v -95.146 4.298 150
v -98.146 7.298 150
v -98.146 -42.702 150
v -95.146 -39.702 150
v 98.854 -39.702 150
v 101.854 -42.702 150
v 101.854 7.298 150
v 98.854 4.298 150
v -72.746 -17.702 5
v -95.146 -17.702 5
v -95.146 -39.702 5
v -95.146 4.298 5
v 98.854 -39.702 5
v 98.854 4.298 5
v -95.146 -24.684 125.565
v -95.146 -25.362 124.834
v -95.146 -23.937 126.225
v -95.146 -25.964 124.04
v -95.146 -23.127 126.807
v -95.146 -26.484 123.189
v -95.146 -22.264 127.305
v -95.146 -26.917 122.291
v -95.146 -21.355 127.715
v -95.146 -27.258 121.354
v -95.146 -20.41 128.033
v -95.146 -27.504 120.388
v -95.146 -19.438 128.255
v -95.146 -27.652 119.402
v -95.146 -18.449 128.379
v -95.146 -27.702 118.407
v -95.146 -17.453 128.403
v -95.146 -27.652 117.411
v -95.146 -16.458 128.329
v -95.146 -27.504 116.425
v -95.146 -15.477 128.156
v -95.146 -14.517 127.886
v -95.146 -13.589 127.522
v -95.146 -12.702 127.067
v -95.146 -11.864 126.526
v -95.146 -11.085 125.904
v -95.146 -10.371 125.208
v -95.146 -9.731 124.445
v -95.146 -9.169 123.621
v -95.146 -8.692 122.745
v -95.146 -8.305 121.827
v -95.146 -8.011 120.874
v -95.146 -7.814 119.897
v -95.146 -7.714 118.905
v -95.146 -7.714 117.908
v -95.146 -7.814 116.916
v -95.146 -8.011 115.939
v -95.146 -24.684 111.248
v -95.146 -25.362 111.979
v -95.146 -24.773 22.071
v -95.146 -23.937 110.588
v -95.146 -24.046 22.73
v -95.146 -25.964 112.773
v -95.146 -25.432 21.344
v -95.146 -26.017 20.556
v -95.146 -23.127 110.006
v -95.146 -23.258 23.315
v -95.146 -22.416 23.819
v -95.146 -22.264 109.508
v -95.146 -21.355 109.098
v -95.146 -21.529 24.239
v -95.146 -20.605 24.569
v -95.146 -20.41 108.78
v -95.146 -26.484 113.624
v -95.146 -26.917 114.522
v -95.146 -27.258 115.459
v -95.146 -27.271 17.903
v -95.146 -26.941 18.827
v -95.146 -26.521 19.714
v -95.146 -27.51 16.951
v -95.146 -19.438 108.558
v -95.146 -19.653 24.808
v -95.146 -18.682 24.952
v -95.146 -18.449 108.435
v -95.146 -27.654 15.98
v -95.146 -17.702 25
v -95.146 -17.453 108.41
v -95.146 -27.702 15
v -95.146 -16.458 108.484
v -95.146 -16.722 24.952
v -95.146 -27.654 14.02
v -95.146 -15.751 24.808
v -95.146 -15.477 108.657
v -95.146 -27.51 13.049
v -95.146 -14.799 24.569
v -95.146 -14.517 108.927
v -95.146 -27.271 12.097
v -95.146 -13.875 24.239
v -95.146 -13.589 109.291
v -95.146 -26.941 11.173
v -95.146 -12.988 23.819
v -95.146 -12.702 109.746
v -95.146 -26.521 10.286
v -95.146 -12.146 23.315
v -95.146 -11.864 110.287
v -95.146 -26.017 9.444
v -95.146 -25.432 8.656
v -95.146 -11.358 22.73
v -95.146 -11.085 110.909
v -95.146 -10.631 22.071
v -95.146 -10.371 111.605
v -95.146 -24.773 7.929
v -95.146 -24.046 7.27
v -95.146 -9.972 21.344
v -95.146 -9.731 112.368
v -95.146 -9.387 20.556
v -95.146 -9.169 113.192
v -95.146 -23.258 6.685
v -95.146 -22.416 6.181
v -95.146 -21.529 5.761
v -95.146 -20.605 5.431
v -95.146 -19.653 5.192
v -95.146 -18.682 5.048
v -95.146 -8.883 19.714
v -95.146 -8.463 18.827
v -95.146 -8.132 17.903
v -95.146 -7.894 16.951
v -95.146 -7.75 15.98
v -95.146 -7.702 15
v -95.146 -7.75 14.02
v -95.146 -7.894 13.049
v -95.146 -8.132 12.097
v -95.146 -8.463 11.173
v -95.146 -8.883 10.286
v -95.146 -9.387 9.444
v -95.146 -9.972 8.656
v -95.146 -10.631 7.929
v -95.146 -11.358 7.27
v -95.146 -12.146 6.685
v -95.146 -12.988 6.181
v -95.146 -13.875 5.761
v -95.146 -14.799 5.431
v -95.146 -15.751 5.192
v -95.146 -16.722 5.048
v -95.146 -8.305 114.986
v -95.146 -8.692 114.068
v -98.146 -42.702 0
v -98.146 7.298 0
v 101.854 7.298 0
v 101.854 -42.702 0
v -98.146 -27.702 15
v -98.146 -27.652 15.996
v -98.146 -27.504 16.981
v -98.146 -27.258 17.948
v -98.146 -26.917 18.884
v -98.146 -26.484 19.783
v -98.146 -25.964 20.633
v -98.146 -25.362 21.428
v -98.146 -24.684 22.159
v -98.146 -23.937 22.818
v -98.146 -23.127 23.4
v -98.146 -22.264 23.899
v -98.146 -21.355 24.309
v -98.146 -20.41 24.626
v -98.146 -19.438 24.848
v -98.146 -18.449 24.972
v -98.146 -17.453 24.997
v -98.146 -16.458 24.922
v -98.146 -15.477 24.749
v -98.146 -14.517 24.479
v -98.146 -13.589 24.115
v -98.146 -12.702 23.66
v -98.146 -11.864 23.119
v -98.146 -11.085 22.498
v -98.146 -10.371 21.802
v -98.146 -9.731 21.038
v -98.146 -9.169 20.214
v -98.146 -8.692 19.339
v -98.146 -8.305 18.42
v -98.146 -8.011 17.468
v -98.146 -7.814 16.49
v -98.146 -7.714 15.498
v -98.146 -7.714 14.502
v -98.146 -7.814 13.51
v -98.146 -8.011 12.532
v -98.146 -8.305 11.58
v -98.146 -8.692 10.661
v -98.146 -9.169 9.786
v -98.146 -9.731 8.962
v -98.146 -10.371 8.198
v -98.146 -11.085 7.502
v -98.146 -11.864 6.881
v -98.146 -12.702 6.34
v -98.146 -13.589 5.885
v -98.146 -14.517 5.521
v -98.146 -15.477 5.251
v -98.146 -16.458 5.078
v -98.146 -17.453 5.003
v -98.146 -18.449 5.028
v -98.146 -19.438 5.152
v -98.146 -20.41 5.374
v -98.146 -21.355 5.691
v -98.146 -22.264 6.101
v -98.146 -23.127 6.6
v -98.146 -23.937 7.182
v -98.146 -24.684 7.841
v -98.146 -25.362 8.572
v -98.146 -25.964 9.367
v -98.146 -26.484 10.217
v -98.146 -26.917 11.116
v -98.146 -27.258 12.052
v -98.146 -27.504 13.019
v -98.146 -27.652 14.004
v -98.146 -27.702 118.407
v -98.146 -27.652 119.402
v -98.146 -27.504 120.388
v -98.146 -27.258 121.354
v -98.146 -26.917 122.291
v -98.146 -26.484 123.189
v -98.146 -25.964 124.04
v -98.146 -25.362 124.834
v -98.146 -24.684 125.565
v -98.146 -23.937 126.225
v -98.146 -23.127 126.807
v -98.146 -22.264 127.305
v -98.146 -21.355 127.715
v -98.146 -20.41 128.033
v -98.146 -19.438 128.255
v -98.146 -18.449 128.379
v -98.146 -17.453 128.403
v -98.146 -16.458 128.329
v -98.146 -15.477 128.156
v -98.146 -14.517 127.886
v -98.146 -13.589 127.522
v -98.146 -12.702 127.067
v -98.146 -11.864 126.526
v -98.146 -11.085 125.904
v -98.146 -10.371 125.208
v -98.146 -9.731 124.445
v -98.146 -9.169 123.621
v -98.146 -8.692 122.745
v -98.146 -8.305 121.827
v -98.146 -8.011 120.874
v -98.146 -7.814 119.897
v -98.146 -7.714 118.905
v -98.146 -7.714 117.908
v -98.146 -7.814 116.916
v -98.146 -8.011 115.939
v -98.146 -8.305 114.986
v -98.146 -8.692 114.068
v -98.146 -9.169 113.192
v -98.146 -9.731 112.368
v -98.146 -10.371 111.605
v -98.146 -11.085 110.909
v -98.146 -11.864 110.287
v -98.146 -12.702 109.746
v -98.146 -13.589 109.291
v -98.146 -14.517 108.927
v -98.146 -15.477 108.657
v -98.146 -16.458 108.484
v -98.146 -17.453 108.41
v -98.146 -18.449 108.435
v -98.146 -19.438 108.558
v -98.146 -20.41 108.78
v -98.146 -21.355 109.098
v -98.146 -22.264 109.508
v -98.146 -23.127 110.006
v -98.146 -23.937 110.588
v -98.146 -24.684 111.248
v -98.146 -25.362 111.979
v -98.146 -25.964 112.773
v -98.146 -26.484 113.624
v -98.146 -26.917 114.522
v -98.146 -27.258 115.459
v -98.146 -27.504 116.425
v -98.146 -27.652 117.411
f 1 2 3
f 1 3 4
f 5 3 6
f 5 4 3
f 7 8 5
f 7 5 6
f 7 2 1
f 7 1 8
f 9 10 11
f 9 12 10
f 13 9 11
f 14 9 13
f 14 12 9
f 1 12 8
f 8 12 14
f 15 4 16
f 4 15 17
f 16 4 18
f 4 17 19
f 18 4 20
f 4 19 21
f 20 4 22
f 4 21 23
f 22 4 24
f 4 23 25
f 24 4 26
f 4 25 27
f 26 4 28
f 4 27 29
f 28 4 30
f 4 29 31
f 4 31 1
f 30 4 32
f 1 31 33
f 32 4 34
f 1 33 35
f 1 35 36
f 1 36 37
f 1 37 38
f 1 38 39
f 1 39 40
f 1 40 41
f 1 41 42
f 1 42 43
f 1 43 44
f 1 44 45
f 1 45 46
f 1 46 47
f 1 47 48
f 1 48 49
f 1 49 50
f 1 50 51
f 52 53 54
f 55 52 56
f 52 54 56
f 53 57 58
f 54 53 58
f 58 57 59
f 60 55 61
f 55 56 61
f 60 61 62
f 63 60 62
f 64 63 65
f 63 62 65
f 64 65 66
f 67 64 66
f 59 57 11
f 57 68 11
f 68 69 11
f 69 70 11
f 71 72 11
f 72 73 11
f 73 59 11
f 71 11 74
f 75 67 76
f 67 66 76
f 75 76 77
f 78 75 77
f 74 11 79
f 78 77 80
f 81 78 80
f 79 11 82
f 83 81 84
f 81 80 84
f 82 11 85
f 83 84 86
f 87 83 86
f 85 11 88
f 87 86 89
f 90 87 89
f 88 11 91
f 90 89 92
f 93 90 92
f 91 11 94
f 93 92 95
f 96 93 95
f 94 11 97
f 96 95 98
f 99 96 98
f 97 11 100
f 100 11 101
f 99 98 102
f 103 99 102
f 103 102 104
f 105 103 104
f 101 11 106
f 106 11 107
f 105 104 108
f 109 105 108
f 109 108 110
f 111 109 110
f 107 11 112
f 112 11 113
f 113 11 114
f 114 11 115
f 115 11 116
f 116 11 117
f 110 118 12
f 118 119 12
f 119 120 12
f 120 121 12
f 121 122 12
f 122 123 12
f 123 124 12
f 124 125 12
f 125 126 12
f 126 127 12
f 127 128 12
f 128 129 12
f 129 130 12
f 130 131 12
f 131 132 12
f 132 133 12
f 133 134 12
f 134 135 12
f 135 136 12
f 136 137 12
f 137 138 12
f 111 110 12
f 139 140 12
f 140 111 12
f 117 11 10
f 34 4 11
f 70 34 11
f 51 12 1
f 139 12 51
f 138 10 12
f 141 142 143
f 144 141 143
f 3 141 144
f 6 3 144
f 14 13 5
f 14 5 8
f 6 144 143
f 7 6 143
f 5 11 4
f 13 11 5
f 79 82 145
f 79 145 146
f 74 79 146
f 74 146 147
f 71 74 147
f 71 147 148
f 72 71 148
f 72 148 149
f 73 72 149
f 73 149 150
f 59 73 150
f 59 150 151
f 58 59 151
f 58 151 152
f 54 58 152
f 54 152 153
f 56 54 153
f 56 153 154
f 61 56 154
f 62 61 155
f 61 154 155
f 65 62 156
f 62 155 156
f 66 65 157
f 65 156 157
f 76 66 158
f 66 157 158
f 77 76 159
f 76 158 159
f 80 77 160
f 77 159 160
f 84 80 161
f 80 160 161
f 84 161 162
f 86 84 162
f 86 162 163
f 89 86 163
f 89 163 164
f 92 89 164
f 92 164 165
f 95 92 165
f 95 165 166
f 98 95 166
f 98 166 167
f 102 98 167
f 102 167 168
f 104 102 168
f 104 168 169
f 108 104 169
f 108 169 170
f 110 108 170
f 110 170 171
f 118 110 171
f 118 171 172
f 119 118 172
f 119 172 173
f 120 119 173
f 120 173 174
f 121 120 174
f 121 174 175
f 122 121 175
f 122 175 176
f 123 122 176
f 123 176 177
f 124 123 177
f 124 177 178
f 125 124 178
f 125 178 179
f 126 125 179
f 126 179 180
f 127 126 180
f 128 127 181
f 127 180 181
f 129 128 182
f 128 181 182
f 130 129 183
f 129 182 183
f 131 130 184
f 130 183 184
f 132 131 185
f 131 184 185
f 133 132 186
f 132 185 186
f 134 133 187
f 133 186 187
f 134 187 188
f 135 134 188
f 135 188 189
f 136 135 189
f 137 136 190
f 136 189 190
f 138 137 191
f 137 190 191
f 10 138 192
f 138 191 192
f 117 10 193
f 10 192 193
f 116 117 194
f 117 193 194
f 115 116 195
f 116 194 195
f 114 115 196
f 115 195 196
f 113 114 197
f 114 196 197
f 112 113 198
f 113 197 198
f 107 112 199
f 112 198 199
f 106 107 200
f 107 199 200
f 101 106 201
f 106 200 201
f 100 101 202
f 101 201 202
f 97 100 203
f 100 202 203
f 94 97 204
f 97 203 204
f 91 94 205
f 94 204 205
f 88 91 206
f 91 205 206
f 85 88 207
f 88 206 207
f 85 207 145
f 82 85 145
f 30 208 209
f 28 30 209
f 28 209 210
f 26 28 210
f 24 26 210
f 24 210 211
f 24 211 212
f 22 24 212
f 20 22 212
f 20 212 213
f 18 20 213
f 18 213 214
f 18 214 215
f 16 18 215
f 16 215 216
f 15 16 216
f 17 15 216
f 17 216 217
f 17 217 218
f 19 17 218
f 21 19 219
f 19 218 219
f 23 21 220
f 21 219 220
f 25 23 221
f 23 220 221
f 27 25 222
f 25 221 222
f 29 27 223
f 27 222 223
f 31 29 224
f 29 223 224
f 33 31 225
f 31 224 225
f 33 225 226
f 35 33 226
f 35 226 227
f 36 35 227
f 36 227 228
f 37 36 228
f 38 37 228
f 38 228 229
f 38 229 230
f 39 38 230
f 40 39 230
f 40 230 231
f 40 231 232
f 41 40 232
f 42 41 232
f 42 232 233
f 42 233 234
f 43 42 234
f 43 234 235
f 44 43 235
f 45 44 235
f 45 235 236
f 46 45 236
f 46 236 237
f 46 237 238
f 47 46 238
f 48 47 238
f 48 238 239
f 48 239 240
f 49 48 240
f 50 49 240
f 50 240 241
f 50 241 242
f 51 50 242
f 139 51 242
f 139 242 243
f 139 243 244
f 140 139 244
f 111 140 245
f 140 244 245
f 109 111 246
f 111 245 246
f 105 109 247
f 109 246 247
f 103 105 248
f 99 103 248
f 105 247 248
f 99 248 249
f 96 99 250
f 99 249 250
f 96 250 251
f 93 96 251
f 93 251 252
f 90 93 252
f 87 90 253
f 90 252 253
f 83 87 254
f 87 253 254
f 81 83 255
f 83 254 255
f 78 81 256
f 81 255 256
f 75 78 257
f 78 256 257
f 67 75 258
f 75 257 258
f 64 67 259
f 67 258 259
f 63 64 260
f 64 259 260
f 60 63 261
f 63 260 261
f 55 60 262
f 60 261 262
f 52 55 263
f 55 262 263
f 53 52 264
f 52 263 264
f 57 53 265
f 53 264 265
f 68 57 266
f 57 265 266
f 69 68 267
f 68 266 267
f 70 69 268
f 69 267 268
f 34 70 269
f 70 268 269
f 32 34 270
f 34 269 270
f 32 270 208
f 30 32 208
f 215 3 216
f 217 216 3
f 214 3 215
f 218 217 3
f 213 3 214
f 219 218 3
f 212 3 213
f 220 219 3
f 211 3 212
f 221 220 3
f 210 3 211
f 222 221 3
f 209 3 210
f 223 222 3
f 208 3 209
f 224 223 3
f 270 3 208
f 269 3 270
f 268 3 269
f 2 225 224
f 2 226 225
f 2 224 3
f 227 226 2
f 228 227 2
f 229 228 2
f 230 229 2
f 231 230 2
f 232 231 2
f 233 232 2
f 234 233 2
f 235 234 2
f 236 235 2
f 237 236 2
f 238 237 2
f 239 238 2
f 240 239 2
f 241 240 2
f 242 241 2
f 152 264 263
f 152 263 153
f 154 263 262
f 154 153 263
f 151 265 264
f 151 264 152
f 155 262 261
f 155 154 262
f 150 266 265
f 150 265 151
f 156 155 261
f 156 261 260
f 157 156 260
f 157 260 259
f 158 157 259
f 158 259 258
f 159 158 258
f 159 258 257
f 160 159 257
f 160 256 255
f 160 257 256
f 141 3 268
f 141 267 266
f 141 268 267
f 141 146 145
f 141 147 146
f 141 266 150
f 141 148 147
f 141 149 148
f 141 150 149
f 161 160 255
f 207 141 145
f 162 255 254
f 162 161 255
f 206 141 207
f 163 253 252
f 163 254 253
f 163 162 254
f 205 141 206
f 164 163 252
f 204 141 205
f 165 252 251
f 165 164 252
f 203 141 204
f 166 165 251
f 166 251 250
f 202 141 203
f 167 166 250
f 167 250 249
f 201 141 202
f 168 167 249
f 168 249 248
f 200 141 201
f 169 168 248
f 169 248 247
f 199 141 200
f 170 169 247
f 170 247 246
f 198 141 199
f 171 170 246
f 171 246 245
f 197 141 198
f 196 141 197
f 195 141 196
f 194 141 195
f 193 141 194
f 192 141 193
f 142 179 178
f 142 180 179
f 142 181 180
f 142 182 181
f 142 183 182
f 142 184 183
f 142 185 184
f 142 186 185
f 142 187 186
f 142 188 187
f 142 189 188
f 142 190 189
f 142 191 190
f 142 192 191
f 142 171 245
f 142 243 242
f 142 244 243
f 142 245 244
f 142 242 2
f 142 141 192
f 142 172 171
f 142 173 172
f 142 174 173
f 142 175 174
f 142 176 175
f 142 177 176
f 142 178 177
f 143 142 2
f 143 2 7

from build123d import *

# Parameters (mm, degrees)
F0_W     = 200
F0_H     = 50
F0_W_2   = 194
F0_H_2   = 44
F1_DEPTH = 150
F2_DEPTH = 5
F3_R     = 10
F4_DEPTH = 25.4
F5_DEPTH = 25.4


with BuildPart() as f1:
    # F0 (on Top) → F1 (new body)
    with BuildSketch(Plane.XY):
        with Locations((1.854228, -17.701853)):
            Rectangle(F0_W, F0_H)
        with Locations((1.854228, -17.701853)):
            Rectangle(F0_W_2, F0_H_2, mode=Mode.SUBTRACT)
    extrude(amount=F1_DEPTH)

    # F0 (on Top) → F2 (join)
    with BuildSketch(Plane.XY):
        with Locations((1.854228, -17.701853)):
            Rectangle(F0_W_2, F0_H_2)
    extrude(amount=F2_DEPTH)

    # F3 (on face) → F4 (cut)
    with BuildSketch(Plane(origin=(-98.145772, 0, 0), x_dir=(0, -1, 0), z_dir=(-1, 0, 0))):
        with Locations((17.701853, 118.406542)):
            Circle(F3_R)
    extrude(amount=-F4_DEPTH, mode=Mode.SUBTRACT)

    # F3 (on face) → F5 (cut)
    with BuildSketch(Plane(origin=(-98.145772, 0, 0), x_dir=(0, -1, 0), z_dir=(-1, 0, 0))):
        with Locations((17.701853, 15)):
            Circle(F3_R)
    extrude(amount=-F5_DEPTH, mode=Mode.SUBTRACT)


solid = f1.part
